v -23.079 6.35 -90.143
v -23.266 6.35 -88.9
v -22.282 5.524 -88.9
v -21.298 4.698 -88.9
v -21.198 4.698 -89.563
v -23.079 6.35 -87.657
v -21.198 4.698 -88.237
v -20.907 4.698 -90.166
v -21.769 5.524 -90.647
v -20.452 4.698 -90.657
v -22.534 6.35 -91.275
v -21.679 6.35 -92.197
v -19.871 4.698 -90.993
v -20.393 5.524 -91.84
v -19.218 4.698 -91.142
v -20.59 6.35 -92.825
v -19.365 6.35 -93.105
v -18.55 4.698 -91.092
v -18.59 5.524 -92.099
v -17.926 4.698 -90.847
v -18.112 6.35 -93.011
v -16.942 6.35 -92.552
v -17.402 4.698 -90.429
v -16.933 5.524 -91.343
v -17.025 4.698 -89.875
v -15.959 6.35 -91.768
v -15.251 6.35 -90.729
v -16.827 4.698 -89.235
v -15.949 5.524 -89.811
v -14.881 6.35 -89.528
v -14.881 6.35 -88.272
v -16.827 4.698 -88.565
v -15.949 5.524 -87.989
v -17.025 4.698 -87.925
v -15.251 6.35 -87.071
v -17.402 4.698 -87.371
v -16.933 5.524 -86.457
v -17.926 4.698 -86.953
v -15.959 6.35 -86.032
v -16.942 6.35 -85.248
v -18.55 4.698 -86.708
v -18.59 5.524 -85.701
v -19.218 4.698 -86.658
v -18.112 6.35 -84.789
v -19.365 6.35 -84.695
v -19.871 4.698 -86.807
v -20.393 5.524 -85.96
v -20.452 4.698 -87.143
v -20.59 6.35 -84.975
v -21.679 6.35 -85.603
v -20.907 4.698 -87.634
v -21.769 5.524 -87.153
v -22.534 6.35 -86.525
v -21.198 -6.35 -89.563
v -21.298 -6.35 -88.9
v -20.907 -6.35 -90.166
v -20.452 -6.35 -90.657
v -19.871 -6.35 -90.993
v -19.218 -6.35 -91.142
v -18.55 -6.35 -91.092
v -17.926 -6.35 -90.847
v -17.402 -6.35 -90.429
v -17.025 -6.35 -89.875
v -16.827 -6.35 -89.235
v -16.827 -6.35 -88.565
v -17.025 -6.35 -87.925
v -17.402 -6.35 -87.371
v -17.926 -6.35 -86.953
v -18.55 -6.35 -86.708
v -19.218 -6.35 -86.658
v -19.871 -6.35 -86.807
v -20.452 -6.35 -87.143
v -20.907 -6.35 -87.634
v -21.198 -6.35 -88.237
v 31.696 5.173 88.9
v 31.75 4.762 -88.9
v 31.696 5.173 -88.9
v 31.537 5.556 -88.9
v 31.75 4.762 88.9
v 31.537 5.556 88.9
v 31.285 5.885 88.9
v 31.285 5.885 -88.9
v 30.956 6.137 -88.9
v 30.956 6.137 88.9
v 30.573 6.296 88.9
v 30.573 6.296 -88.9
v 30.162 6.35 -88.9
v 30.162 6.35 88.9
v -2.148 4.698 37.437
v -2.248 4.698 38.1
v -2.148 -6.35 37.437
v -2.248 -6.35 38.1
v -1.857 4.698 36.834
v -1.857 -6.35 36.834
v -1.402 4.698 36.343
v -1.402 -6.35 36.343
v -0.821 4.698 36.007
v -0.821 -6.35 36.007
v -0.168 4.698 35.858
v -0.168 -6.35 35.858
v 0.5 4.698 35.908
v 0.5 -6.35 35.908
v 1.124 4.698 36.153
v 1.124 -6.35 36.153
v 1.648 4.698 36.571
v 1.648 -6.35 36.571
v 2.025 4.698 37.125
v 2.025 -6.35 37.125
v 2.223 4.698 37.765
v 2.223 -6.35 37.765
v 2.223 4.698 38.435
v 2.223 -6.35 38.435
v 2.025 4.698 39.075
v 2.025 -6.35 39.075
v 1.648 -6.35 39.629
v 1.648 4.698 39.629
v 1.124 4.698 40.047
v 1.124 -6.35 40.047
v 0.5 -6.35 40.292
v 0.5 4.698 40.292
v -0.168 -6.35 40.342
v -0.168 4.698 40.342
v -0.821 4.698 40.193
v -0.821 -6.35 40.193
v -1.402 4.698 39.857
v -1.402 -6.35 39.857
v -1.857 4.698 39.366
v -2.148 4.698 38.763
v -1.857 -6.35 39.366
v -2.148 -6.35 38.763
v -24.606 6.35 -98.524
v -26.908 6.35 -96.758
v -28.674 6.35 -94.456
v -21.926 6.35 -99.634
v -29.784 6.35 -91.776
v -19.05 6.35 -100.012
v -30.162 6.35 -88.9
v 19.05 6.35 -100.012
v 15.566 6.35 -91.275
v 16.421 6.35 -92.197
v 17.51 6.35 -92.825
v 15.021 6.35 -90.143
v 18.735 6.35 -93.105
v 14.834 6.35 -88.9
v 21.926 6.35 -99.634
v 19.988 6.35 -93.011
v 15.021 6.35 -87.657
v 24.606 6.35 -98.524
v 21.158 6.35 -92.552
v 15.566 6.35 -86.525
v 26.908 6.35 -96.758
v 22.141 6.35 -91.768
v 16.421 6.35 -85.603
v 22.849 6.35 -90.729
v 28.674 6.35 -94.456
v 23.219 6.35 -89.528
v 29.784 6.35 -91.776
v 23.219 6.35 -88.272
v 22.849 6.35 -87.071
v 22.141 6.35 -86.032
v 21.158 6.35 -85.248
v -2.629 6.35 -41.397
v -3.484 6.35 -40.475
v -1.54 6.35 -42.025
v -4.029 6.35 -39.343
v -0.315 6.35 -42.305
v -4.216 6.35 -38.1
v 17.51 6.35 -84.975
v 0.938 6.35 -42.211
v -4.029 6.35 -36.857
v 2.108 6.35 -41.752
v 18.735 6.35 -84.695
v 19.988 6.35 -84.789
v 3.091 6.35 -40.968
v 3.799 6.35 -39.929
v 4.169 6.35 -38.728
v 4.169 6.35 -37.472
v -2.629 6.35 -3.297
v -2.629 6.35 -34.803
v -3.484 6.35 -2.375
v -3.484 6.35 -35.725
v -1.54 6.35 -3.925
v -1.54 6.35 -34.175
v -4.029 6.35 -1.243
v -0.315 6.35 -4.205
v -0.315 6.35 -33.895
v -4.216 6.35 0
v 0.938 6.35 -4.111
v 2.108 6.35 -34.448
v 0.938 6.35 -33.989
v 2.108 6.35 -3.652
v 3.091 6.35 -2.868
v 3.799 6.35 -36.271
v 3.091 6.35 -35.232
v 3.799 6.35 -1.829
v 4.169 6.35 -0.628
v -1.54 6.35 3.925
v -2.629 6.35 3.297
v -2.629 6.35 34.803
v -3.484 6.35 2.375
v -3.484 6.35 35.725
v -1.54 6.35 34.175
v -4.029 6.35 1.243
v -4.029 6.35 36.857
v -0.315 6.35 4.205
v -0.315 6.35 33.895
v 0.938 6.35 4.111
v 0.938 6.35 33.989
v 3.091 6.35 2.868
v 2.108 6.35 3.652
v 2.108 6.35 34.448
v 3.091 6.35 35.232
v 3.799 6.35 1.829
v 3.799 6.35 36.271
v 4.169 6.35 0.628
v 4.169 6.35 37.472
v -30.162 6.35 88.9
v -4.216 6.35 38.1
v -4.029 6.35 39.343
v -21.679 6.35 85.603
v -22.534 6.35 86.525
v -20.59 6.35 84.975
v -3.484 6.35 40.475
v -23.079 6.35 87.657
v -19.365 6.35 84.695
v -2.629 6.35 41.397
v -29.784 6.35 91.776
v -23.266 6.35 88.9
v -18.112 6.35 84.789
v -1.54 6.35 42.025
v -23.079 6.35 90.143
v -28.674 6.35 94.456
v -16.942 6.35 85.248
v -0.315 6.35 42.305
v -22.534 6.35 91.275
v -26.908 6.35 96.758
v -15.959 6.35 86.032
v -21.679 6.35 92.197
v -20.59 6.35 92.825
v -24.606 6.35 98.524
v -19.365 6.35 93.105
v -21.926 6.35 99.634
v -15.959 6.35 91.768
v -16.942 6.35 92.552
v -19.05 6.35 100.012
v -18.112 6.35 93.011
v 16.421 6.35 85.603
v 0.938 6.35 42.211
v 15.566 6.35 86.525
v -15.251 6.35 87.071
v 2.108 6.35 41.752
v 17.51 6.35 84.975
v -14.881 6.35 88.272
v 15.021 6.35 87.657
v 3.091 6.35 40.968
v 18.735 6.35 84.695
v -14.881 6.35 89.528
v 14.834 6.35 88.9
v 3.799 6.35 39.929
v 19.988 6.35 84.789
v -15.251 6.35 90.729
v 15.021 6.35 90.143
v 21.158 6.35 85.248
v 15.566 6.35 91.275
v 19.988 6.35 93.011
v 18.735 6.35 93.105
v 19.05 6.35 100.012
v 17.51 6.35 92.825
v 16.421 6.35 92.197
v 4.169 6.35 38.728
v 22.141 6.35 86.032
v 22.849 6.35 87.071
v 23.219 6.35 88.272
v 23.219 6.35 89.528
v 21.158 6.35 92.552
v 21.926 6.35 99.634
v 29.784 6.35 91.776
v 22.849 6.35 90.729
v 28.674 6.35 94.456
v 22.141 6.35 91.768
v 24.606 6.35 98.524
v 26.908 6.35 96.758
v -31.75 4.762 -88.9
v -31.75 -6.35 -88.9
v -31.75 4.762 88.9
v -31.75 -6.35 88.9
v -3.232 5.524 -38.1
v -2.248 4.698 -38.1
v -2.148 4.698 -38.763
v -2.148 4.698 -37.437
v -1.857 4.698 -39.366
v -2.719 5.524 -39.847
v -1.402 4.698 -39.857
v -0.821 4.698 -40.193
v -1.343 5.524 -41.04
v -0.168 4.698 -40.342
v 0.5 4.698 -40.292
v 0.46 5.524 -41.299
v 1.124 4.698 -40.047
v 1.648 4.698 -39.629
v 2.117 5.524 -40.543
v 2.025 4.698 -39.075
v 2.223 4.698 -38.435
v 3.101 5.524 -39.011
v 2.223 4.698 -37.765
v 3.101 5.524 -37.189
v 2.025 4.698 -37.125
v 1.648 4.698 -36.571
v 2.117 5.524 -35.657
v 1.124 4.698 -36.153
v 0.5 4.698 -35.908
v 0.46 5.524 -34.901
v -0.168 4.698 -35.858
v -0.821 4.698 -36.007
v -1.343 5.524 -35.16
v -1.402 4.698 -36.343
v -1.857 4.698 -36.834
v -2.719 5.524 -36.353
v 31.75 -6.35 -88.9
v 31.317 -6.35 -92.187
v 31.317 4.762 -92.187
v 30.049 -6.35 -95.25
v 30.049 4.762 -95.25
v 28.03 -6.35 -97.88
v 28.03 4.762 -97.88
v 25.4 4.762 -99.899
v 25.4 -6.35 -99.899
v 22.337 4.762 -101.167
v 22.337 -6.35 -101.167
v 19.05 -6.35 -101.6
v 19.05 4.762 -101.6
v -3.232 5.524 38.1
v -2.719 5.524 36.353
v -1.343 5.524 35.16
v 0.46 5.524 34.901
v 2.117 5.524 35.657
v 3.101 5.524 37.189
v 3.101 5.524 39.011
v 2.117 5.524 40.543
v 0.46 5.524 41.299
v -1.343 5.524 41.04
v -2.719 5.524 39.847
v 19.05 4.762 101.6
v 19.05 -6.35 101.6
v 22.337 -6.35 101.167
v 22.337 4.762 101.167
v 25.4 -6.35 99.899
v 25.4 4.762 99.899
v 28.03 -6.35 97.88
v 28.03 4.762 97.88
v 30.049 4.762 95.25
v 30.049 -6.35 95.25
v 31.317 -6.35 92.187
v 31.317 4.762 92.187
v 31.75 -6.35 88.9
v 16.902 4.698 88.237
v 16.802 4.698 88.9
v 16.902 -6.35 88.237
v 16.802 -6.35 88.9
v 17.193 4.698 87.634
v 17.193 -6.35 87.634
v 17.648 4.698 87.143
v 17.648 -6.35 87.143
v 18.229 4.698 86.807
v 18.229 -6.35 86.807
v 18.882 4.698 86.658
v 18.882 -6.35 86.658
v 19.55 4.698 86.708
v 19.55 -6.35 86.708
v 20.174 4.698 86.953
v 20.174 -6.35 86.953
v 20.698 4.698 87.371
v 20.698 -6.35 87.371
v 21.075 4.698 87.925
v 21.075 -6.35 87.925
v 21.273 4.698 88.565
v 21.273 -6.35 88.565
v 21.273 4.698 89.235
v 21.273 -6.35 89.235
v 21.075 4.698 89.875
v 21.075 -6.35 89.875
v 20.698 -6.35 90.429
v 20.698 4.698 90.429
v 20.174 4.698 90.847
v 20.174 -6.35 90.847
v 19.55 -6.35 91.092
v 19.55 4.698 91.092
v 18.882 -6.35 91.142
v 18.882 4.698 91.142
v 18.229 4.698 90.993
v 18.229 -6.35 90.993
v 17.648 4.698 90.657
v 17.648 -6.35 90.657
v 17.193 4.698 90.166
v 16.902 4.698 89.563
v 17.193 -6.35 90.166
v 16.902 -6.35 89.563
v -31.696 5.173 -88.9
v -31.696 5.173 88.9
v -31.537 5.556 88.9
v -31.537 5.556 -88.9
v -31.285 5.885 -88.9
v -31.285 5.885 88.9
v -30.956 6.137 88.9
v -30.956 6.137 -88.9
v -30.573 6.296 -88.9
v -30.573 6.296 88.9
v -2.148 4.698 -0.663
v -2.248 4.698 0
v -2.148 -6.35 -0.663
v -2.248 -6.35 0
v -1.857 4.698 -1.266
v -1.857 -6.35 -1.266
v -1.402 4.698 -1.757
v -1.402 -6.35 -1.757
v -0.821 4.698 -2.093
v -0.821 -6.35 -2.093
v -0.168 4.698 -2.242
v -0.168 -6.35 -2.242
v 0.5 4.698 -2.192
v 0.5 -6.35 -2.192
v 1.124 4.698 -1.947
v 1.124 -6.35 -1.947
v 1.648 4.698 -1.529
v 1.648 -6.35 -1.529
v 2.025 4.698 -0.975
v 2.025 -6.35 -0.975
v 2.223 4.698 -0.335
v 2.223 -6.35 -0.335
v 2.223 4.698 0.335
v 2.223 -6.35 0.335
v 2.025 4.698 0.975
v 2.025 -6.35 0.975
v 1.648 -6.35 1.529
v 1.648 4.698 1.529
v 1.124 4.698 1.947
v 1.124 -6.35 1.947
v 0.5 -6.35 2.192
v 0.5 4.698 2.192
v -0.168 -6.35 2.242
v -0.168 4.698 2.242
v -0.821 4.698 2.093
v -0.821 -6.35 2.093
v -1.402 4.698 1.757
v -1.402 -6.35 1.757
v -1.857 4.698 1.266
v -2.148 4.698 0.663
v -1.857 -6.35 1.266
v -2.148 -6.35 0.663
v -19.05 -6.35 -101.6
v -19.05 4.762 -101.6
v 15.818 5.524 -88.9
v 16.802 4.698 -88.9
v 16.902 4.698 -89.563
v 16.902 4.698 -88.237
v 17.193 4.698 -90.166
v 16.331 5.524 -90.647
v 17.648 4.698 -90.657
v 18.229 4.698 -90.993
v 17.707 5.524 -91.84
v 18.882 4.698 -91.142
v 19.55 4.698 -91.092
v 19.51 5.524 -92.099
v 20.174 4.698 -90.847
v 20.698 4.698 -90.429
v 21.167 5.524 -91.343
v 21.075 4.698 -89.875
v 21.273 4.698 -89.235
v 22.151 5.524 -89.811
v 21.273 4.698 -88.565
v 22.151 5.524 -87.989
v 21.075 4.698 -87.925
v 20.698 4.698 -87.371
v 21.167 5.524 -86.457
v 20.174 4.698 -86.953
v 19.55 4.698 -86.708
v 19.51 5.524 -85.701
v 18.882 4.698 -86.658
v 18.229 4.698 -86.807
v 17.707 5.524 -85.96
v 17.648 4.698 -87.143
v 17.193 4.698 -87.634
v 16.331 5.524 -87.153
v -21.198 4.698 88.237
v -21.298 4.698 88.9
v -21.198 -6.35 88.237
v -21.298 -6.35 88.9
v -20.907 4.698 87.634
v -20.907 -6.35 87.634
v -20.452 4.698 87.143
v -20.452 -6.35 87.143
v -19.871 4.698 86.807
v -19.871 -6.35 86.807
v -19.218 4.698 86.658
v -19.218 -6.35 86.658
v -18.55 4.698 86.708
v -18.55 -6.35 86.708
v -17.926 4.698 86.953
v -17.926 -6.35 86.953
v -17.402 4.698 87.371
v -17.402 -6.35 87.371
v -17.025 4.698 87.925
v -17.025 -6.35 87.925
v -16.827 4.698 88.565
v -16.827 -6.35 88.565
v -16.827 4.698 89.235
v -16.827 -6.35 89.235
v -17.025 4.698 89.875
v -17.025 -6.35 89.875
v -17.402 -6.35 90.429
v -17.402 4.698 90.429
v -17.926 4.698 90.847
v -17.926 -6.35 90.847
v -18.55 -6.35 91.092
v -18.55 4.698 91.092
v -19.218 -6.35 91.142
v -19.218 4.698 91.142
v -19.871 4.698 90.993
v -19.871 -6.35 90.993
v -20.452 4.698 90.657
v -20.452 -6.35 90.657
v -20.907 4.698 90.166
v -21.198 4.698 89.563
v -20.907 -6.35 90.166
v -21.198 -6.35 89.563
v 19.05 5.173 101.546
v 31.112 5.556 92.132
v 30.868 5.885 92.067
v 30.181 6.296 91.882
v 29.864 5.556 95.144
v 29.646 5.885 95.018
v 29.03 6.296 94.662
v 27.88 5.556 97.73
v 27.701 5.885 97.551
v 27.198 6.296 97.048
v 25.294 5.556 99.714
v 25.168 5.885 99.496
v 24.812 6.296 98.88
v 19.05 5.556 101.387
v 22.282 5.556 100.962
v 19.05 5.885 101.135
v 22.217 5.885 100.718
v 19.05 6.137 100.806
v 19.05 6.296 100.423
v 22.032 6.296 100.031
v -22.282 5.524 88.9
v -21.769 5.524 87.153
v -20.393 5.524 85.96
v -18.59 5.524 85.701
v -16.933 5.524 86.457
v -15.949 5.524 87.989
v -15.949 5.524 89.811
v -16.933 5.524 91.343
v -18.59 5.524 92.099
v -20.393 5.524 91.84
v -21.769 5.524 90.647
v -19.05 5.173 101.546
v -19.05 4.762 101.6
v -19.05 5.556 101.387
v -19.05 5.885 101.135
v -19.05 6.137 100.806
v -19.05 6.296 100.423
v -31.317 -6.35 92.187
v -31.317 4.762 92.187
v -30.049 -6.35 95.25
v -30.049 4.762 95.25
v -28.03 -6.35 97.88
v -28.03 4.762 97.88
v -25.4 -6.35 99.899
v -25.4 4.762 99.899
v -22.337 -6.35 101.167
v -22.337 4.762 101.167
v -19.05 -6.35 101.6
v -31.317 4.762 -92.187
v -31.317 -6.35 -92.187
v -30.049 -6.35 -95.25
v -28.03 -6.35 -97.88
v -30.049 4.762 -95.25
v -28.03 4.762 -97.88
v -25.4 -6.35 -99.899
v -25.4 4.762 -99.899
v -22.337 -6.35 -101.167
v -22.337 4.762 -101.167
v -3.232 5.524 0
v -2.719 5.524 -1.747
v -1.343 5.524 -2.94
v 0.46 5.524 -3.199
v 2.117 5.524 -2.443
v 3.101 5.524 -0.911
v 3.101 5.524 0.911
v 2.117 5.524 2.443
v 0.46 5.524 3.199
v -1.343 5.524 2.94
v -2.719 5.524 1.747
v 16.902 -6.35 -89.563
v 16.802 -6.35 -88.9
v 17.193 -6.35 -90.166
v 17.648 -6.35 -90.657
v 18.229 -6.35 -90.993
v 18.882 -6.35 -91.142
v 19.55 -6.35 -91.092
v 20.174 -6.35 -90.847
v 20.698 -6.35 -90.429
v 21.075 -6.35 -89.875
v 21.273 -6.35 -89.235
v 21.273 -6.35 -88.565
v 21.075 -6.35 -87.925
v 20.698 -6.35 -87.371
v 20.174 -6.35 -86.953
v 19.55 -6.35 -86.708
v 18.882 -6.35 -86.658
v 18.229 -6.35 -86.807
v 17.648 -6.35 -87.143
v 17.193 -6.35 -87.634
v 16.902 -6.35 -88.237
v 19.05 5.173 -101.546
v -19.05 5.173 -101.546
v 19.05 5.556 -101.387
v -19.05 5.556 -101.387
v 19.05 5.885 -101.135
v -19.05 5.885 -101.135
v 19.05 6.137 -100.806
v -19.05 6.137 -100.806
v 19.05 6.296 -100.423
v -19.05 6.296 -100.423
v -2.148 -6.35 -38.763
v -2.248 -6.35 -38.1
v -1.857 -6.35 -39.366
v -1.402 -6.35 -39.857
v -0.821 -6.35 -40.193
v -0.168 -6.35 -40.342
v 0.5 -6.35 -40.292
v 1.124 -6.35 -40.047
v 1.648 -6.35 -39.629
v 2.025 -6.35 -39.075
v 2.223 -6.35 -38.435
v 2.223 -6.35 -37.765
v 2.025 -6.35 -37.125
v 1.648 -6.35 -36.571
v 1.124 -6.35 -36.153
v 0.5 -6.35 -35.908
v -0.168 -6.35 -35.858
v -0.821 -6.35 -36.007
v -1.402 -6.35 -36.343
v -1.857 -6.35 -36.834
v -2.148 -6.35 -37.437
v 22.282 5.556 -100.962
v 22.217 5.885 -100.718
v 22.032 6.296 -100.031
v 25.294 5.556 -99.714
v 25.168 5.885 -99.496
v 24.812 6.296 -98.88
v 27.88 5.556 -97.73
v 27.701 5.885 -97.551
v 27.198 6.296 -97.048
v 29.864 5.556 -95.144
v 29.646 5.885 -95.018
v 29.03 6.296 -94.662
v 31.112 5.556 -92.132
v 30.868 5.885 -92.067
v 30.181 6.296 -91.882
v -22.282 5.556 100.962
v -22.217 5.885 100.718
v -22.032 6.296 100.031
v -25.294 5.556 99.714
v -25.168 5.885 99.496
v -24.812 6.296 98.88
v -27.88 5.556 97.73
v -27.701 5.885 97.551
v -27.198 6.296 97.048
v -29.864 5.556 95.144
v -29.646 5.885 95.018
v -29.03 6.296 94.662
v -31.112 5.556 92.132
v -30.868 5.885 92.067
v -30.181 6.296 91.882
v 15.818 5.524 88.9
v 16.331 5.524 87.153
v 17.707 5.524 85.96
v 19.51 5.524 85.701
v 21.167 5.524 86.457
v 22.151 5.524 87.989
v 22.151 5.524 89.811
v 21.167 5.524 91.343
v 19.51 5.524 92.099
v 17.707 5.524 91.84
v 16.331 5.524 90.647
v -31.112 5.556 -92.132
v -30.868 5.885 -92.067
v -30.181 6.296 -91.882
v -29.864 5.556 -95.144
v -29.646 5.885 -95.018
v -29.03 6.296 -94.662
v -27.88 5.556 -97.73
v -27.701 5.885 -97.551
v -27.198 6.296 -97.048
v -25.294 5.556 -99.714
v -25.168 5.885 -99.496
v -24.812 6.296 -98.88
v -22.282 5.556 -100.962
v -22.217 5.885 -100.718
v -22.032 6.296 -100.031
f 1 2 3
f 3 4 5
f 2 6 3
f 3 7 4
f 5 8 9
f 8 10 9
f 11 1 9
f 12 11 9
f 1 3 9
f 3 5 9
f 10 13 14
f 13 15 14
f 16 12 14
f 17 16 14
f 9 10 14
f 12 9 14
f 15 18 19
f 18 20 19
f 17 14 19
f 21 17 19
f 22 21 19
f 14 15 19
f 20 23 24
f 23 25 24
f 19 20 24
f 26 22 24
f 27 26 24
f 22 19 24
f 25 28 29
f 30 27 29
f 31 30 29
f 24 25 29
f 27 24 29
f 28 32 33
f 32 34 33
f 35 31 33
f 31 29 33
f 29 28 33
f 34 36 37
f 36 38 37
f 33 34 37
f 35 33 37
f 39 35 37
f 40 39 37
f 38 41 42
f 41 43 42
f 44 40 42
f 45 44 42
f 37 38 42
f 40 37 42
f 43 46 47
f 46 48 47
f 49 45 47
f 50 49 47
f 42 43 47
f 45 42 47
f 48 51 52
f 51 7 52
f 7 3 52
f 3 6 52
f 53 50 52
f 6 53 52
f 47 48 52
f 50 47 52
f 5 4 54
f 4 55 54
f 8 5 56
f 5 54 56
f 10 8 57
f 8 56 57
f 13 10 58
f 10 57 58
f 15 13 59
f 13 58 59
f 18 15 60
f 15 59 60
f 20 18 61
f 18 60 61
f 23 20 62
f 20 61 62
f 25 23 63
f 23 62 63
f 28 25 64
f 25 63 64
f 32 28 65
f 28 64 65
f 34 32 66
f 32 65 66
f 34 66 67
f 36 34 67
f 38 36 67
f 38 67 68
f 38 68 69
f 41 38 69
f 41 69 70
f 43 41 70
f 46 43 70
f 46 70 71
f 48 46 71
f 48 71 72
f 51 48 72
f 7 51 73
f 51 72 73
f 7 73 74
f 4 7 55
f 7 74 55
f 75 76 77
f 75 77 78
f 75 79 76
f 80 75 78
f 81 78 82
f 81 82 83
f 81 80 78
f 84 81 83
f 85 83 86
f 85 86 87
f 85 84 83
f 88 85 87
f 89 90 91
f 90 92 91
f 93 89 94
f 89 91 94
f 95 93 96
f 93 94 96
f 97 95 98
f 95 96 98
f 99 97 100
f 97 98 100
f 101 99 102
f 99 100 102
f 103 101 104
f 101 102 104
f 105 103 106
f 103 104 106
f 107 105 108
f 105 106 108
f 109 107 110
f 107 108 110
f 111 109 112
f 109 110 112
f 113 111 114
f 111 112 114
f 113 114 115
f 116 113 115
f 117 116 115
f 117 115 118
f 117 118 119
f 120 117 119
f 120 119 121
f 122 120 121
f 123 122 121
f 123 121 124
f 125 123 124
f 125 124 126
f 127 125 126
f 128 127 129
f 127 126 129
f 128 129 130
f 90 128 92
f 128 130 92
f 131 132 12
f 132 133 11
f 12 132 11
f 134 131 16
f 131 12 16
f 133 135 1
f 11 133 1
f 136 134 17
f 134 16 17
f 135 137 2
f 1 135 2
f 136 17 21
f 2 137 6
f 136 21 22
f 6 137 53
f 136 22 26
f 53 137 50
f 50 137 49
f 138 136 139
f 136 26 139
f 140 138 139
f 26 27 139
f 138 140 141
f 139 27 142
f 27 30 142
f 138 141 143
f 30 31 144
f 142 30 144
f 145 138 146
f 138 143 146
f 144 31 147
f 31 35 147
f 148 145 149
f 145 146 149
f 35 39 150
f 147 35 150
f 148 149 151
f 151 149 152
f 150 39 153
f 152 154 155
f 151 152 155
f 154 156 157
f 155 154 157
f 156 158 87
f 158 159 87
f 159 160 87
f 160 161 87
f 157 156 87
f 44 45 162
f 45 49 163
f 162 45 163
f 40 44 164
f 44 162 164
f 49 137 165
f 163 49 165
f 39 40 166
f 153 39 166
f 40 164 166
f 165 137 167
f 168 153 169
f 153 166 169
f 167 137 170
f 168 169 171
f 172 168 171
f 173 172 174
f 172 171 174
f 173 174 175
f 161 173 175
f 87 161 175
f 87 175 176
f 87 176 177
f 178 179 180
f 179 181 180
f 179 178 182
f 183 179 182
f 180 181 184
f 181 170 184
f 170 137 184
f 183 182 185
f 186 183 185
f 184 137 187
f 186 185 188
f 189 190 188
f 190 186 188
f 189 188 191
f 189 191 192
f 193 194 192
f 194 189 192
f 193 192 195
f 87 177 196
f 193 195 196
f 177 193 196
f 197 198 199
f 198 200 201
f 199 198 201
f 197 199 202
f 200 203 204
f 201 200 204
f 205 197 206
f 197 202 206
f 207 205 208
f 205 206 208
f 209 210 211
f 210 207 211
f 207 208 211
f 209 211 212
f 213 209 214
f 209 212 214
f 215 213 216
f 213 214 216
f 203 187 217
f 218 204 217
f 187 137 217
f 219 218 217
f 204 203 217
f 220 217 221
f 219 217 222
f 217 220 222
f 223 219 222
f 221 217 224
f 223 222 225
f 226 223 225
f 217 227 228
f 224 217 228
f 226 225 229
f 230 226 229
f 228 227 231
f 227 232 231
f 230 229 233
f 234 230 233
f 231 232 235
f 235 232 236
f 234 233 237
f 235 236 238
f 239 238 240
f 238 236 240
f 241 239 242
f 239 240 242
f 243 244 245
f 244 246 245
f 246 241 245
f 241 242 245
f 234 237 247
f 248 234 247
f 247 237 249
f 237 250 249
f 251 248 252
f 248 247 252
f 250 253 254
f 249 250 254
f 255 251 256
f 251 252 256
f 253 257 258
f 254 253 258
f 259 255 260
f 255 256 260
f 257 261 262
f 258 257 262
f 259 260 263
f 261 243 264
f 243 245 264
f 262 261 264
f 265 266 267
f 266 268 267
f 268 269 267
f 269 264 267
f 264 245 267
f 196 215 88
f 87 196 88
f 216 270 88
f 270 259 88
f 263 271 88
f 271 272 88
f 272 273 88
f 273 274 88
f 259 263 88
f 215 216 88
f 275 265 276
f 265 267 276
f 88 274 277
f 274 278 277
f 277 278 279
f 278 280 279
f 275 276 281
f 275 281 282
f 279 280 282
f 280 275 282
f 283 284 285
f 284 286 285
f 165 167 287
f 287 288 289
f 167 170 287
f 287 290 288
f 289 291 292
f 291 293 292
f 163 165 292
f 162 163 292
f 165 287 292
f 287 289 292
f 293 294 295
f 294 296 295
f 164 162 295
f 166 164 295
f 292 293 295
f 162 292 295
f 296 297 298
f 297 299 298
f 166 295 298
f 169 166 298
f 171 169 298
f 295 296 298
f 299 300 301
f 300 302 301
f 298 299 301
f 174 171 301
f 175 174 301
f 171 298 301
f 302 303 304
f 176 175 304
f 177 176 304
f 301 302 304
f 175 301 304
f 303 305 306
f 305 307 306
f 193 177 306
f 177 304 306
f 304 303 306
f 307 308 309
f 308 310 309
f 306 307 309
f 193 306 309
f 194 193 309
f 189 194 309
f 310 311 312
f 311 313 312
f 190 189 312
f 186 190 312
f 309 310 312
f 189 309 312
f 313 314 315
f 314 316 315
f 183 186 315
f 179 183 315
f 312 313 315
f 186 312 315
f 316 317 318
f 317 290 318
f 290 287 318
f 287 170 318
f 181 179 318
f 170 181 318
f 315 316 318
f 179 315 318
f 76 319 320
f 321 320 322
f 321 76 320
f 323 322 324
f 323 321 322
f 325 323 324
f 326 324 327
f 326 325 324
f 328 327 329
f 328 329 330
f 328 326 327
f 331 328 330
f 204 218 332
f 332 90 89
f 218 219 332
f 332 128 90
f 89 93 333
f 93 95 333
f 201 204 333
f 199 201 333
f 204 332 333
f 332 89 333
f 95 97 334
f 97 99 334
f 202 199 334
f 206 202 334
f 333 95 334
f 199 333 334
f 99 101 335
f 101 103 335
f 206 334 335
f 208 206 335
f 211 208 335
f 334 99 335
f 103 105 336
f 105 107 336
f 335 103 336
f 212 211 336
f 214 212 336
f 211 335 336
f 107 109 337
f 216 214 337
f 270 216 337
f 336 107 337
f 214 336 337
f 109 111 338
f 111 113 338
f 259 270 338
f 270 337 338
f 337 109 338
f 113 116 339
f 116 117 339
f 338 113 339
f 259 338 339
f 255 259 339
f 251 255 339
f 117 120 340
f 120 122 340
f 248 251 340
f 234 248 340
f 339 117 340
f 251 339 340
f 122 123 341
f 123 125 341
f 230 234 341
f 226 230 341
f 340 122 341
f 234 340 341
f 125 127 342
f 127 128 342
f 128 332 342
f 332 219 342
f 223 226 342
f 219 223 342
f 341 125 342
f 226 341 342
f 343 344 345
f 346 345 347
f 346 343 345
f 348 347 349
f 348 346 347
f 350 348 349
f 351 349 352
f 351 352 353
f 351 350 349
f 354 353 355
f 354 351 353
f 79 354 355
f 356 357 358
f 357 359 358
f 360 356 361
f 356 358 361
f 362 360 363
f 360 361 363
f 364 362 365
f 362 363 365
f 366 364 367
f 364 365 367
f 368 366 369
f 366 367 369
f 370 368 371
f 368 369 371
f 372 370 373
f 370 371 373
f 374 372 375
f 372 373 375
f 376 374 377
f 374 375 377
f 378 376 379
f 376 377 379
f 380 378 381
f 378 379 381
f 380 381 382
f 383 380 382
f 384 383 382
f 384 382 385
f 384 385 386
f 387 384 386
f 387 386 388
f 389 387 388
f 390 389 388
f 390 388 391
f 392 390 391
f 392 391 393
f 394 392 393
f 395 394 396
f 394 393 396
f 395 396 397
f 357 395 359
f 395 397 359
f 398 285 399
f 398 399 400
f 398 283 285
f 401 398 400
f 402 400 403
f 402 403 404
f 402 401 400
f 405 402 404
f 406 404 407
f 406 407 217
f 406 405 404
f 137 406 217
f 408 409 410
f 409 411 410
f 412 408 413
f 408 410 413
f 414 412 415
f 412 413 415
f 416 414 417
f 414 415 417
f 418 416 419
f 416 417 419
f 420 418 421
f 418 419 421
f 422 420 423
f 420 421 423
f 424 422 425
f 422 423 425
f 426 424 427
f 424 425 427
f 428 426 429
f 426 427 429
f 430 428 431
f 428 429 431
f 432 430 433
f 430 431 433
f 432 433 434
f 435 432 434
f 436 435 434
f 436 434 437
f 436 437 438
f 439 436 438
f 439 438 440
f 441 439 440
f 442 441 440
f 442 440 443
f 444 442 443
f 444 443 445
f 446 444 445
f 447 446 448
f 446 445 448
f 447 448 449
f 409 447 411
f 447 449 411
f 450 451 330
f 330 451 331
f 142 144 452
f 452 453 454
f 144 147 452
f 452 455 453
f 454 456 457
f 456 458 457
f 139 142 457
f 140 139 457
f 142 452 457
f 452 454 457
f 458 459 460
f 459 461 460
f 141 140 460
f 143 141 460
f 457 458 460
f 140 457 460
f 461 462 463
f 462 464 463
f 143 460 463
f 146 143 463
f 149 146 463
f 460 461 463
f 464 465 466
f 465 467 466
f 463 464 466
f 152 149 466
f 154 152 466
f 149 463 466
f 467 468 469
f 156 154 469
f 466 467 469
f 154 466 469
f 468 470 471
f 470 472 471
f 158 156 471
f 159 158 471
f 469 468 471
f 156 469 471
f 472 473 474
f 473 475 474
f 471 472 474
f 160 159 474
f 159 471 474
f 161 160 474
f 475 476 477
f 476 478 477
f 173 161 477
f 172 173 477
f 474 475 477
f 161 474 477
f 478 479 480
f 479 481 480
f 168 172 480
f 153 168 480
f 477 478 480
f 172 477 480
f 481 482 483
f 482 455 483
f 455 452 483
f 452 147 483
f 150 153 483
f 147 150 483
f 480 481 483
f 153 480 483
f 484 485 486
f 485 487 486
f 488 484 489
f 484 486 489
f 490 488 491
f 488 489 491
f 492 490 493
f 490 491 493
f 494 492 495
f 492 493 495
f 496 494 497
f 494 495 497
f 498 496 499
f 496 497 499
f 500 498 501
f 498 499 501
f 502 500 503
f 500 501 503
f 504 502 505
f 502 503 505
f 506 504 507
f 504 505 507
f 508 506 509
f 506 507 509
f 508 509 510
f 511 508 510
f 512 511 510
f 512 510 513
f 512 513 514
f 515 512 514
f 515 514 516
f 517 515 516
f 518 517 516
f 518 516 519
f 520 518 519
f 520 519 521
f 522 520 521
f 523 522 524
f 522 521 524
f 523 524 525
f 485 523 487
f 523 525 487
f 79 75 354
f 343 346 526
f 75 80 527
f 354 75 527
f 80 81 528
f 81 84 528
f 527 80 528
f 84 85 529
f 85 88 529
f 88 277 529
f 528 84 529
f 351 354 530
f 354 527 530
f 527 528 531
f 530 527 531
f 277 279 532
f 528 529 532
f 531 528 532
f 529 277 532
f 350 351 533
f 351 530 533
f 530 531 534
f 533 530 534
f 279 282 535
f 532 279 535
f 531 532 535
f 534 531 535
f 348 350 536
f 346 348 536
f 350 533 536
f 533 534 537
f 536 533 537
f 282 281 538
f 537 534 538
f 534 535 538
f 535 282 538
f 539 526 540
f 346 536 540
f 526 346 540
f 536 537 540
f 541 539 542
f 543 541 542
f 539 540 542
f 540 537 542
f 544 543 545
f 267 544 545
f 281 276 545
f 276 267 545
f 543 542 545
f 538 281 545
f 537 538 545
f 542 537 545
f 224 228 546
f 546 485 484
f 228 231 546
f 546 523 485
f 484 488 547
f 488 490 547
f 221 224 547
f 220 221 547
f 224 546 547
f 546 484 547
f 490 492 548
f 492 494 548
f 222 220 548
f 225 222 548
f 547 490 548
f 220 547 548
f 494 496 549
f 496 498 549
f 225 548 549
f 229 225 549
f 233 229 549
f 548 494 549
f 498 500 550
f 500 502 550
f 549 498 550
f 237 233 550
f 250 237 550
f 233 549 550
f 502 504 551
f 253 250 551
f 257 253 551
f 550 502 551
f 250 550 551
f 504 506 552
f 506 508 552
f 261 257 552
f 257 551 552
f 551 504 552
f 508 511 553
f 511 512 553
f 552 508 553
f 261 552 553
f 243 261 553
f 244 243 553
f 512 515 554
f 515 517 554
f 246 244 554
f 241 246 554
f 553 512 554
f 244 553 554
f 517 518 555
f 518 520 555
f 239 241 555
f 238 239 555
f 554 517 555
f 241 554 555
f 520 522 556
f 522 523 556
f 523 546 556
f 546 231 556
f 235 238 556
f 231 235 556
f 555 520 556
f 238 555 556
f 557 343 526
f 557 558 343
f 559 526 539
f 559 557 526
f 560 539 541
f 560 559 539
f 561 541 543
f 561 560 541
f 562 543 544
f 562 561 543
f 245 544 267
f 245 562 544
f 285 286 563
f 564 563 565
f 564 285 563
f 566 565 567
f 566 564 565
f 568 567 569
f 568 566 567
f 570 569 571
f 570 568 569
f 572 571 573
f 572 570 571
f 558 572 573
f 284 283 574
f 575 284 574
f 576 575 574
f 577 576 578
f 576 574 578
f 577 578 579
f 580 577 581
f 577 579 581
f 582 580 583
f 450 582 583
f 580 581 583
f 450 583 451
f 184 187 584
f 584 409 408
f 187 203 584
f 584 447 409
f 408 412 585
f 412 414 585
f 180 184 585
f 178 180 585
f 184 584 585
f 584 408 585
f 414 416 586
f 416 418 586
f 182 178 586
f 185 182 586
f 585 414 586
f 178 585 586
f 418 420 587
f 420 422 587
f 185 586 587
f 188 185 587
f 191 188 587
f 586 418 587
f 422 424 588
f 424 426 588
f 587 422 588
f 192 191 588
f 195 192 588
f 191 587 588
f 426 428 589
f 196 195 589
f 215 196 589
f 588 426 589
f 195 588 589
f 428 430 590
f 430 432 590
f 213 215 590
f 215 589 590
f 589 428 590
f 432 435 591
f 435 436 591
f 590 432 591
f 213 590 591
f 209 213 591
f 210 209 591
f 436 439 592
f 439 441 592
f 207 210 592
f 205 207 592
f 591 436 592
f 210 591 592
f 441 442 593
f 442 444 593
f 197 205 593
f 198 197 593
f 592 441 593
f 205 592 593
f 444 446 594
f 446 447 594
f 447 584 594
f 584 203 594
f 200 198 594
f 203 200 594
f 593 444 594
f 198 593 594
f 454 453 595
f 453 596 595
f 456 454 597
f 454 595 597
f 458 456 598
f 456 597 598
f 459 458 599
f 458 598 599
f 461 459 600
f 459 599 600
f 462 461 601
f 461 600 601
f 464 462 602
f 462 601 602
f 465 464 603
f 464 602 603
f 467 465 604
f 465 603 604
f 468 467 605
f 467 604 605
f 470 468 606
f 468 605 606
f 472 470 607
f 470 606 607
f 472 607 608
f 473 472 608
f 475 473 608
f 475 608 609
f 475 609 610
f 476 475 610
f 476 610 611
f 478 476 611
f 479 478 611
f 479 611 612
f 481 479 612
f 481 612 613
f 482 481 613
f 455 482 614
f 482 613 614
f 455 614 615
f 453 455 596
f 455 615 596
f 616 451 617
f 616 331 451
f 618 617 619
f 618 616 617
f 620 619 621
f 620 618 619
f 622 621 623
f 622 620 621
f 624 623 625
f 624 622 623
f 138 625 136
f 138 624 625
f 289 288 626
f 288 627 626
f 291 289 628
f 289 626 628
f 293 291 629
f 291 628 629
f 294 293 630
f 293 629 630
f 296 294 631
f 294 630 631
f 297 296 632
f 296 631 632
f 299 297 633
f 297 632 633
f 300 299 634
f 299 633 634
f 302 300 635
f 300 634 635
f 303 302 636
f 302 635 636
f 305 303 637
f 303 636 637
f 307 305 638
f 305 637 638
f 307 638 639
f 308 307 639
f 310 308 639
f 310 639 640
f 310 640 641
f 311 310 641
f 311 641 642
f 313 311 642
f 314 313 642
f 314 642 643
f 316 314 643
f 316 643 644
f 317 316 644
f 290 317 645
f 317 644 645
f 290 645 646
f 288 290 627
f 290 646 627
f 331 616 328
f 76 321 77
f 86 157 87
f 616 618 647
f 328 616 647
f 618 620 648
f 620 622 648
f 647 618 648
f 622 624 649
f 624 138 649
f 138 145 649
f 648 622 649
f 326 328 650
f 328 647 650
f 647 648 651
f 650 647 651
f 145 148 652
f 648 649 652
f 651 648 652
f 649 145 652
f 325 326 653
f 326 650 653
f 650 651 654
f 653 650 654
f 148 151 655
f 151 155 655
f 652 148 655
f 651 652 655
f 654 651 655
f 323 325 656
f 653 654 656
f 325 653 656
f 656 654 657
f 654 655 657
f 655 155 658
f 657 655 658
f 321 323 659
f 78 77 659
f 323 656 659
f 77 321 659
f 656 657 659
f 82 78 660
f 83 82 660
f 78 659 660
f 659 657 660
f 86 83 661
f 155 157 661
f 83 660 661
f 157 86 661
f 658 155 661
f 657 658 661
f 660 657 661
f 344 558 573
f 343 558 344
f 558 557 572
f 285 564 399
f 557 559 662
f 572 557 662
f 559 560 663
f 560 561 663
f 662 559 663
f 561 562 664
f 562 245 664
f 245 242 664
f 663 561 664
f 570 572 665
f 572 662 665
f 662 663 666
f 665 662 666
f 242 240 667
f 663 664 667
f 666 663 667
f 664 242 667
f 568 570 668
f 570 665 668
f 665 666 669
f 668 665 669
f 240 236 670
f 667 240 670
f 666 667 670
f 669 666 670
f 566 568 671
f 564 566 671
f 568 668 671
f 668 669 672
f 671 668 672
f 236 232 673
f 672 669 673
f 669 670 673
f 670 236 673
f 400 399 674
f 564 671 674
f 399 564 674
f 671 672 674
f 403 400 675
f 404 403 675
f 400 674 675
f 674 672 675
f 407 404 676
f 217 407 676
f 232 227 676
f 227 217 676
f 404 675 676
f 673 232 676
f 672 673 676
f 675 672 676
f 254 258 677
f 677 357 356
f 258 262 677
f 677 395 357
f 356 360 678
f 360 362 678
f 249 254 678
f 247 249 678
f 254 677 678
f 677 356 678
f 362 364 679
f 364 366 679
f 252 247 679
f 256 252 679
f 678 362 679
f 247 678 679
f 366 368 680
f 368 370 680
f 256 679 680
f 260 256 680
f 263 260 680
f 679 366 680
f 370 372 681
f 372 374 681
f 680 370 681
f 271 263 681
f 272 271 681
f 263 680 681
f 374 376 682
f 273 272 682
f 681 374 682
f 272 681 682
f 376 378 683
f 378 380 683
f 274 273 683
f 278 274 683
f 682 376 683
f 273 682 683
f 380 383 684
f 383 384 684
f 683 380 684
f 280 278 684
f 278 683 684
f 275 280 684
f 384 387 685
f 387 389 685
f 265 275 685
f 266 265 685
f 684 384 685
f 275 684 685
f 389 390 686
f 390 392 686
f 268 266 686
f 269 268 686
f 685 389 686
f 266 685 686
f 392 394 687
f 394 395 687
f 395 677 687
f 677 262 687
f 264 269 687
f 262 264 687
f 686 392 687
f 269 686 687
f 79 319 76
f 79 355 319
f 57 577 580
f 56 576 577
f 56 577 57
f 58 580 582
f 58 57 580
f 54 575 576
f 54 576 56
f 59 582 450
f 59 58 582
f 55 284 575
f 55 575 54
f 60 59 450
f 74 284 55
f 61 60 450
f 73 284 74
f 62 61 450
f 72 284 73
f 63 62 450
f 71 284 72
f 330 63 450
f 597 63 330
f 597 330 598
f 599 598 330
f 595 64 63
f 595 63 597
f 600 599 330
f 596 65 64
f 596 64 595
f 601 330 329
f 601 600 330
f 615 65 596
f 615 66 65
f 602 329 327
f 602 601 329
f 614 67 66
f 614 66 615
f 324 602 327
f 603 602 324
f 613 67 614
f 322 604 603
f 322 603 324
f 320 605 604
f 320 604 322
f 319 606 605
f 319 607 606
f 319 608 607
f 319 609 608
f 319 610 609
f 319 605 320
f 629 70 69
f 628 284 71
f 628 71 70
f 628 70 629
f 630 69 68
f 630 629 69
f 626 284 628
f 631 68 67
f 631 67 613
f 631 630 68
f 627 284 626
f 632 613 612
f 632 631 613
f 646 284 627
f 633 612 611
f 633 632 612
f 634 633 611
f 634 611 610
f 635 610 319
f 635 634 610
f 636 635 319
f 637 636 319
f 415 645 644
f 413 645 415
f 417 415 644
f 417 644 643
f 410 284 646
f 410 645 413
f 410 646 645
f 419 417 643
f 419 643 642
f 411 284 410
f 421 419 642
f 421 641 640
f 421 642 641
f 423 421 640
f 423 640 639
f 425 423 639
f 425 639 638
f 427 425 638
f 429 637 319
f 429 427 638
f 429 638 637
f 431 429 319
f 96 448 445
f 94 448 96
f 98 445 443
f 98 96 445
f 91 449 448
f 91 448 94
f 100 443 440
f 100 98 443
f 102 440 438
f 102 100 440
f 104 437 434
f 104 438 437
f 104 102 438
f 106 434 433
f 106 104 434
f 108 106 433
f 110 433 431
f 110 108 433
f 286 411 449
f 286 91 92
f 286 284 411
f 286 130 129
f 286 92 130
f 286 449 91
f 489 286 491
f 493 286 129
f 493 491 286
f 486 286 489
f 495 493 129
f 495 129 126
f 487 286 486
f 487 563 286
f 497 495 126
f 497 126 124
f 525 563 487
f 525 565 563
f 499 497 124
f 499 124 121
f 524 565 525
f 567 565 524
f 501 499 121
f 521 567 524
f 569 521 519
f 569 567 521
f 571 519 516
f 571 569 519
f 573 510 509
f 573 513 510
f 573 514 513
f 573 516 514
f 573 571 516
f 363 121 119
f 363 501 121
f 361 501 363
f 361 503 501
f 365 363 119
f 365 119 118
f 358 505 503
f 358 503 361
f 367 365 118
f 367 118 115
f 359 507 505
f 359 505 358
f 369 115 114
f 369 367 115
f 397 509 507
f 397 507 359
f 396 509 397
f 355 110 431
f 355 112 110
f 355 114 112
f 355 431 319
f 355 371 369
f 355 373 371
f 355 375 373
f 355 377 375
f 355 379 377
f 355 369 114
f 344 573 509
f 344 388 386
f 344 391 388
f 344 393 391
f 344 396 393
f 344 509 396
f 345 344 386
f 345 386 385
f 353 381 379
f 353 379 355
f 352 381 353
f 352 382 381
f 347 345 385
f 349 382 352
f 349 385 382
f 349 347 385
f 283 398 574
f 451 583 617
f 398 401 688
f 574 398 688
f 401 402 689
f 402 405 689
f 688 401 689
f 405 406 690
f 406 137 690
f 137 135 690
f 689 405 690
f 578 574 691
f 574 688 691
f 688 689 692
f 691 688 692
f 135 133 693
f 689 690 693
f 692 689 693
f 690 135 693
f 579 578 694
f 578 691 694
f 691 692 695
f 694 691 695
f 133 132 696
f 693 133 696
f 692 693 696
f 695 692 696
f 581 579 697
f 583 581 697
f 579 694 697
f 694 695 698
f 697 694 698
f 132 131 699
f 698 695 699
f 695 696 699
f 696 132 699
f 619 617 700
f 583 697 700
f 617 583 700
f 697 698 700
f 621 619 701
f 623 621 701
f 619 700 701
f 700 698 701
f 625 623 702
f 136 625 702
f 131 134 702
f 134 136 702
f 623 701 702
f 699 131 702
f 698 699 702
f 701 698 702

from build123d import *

# Parameters (mm, degrees)
SKETCH1_W                                         = 63.5
SKETCH1_H                                         = 12.7
BOSS_EXTRUDE1_DEPTH                               = 101.6
FILLET1_R                                         = 12.7
CSK_FOR_8_FLAT_HEAD_MACHINE_SCREW_100_D           = 4.4958
CSK_FOR_8_FLAT_HEAD_MACHINE_SCREW_100_CSINK_D     = 8.4328
CSK_FOR_8_FLAT_HEAD_MACHINE_SCREW_100_CSINK_ANGLE = 100
FILLET2_R                                         = 1.5875


with BuildPart() as part:
    # Sketch1 → Boss-Extrude1 (new, symmetric)
    with BuildSketch(Plane.XY):
        Rectangle(SKETCH1_W, SKETCH1_H)
    extrude(amount=BOSS_EXTRUDE1_DEPTH, both=True)

    # Fillet1
    fillet1_edges = [part.edges().sort_by_distance(p)[0] for p in [
        (-31.75, 0, 101.6),
        (31.75, 0, 101.6),
        (-31.75, 0, -101.6),
        (31.75, 0, -101.6),
    ]]
    fillet(fillet1_edges, radius=FILLET1_R)

    # CSK for #8 Flat Head Machine Screw (100)1 (through all)
    with Locations(Plane(origin=(0, 6.35, 0), x_dir=(1, 0, 0), z_dir=(0, 1, 0))):
        with Locations((19.05, -88.9), (-19.05, -88.9), (-19.05, 88.9), (19.05, 88.9), (0, -38.1), (0, 38.1), (0, 0)):
            CounterSinkHole(CSK_FOR_8_FLAT_HEAD_MACHINE_SCREW_100_D / 2, CSK_FOR_8_FLAT_HEAD_MACHINE_SCREW_100_CSINK_D / 2, counter_sink_angle=CSK_FOR_8_FLAT_HEAD_MACHINE_SCREW_100_CSINK_ANGLE)

    # Fillet2
    fillet2_edges = [part.edges().sort_by_distance(p)[0] for p in [
        (-31.75, 6.35, 0),
        (0, 6.35, -101.6),
        (0, 6.35, 101.6),
        (31.75, 6.35, 0),
        (28.030256121, 6.35, 97.880256121),
        (-28.030256121, 6.35, 97.880256121),
        (28.030256121, 6.35, -97.880256121),
        (-28.030256121, 6.35, -97.880256121),
    ]]
    fillet(fillet2_edges, radius=FILLET2_R)


solid = part.part
